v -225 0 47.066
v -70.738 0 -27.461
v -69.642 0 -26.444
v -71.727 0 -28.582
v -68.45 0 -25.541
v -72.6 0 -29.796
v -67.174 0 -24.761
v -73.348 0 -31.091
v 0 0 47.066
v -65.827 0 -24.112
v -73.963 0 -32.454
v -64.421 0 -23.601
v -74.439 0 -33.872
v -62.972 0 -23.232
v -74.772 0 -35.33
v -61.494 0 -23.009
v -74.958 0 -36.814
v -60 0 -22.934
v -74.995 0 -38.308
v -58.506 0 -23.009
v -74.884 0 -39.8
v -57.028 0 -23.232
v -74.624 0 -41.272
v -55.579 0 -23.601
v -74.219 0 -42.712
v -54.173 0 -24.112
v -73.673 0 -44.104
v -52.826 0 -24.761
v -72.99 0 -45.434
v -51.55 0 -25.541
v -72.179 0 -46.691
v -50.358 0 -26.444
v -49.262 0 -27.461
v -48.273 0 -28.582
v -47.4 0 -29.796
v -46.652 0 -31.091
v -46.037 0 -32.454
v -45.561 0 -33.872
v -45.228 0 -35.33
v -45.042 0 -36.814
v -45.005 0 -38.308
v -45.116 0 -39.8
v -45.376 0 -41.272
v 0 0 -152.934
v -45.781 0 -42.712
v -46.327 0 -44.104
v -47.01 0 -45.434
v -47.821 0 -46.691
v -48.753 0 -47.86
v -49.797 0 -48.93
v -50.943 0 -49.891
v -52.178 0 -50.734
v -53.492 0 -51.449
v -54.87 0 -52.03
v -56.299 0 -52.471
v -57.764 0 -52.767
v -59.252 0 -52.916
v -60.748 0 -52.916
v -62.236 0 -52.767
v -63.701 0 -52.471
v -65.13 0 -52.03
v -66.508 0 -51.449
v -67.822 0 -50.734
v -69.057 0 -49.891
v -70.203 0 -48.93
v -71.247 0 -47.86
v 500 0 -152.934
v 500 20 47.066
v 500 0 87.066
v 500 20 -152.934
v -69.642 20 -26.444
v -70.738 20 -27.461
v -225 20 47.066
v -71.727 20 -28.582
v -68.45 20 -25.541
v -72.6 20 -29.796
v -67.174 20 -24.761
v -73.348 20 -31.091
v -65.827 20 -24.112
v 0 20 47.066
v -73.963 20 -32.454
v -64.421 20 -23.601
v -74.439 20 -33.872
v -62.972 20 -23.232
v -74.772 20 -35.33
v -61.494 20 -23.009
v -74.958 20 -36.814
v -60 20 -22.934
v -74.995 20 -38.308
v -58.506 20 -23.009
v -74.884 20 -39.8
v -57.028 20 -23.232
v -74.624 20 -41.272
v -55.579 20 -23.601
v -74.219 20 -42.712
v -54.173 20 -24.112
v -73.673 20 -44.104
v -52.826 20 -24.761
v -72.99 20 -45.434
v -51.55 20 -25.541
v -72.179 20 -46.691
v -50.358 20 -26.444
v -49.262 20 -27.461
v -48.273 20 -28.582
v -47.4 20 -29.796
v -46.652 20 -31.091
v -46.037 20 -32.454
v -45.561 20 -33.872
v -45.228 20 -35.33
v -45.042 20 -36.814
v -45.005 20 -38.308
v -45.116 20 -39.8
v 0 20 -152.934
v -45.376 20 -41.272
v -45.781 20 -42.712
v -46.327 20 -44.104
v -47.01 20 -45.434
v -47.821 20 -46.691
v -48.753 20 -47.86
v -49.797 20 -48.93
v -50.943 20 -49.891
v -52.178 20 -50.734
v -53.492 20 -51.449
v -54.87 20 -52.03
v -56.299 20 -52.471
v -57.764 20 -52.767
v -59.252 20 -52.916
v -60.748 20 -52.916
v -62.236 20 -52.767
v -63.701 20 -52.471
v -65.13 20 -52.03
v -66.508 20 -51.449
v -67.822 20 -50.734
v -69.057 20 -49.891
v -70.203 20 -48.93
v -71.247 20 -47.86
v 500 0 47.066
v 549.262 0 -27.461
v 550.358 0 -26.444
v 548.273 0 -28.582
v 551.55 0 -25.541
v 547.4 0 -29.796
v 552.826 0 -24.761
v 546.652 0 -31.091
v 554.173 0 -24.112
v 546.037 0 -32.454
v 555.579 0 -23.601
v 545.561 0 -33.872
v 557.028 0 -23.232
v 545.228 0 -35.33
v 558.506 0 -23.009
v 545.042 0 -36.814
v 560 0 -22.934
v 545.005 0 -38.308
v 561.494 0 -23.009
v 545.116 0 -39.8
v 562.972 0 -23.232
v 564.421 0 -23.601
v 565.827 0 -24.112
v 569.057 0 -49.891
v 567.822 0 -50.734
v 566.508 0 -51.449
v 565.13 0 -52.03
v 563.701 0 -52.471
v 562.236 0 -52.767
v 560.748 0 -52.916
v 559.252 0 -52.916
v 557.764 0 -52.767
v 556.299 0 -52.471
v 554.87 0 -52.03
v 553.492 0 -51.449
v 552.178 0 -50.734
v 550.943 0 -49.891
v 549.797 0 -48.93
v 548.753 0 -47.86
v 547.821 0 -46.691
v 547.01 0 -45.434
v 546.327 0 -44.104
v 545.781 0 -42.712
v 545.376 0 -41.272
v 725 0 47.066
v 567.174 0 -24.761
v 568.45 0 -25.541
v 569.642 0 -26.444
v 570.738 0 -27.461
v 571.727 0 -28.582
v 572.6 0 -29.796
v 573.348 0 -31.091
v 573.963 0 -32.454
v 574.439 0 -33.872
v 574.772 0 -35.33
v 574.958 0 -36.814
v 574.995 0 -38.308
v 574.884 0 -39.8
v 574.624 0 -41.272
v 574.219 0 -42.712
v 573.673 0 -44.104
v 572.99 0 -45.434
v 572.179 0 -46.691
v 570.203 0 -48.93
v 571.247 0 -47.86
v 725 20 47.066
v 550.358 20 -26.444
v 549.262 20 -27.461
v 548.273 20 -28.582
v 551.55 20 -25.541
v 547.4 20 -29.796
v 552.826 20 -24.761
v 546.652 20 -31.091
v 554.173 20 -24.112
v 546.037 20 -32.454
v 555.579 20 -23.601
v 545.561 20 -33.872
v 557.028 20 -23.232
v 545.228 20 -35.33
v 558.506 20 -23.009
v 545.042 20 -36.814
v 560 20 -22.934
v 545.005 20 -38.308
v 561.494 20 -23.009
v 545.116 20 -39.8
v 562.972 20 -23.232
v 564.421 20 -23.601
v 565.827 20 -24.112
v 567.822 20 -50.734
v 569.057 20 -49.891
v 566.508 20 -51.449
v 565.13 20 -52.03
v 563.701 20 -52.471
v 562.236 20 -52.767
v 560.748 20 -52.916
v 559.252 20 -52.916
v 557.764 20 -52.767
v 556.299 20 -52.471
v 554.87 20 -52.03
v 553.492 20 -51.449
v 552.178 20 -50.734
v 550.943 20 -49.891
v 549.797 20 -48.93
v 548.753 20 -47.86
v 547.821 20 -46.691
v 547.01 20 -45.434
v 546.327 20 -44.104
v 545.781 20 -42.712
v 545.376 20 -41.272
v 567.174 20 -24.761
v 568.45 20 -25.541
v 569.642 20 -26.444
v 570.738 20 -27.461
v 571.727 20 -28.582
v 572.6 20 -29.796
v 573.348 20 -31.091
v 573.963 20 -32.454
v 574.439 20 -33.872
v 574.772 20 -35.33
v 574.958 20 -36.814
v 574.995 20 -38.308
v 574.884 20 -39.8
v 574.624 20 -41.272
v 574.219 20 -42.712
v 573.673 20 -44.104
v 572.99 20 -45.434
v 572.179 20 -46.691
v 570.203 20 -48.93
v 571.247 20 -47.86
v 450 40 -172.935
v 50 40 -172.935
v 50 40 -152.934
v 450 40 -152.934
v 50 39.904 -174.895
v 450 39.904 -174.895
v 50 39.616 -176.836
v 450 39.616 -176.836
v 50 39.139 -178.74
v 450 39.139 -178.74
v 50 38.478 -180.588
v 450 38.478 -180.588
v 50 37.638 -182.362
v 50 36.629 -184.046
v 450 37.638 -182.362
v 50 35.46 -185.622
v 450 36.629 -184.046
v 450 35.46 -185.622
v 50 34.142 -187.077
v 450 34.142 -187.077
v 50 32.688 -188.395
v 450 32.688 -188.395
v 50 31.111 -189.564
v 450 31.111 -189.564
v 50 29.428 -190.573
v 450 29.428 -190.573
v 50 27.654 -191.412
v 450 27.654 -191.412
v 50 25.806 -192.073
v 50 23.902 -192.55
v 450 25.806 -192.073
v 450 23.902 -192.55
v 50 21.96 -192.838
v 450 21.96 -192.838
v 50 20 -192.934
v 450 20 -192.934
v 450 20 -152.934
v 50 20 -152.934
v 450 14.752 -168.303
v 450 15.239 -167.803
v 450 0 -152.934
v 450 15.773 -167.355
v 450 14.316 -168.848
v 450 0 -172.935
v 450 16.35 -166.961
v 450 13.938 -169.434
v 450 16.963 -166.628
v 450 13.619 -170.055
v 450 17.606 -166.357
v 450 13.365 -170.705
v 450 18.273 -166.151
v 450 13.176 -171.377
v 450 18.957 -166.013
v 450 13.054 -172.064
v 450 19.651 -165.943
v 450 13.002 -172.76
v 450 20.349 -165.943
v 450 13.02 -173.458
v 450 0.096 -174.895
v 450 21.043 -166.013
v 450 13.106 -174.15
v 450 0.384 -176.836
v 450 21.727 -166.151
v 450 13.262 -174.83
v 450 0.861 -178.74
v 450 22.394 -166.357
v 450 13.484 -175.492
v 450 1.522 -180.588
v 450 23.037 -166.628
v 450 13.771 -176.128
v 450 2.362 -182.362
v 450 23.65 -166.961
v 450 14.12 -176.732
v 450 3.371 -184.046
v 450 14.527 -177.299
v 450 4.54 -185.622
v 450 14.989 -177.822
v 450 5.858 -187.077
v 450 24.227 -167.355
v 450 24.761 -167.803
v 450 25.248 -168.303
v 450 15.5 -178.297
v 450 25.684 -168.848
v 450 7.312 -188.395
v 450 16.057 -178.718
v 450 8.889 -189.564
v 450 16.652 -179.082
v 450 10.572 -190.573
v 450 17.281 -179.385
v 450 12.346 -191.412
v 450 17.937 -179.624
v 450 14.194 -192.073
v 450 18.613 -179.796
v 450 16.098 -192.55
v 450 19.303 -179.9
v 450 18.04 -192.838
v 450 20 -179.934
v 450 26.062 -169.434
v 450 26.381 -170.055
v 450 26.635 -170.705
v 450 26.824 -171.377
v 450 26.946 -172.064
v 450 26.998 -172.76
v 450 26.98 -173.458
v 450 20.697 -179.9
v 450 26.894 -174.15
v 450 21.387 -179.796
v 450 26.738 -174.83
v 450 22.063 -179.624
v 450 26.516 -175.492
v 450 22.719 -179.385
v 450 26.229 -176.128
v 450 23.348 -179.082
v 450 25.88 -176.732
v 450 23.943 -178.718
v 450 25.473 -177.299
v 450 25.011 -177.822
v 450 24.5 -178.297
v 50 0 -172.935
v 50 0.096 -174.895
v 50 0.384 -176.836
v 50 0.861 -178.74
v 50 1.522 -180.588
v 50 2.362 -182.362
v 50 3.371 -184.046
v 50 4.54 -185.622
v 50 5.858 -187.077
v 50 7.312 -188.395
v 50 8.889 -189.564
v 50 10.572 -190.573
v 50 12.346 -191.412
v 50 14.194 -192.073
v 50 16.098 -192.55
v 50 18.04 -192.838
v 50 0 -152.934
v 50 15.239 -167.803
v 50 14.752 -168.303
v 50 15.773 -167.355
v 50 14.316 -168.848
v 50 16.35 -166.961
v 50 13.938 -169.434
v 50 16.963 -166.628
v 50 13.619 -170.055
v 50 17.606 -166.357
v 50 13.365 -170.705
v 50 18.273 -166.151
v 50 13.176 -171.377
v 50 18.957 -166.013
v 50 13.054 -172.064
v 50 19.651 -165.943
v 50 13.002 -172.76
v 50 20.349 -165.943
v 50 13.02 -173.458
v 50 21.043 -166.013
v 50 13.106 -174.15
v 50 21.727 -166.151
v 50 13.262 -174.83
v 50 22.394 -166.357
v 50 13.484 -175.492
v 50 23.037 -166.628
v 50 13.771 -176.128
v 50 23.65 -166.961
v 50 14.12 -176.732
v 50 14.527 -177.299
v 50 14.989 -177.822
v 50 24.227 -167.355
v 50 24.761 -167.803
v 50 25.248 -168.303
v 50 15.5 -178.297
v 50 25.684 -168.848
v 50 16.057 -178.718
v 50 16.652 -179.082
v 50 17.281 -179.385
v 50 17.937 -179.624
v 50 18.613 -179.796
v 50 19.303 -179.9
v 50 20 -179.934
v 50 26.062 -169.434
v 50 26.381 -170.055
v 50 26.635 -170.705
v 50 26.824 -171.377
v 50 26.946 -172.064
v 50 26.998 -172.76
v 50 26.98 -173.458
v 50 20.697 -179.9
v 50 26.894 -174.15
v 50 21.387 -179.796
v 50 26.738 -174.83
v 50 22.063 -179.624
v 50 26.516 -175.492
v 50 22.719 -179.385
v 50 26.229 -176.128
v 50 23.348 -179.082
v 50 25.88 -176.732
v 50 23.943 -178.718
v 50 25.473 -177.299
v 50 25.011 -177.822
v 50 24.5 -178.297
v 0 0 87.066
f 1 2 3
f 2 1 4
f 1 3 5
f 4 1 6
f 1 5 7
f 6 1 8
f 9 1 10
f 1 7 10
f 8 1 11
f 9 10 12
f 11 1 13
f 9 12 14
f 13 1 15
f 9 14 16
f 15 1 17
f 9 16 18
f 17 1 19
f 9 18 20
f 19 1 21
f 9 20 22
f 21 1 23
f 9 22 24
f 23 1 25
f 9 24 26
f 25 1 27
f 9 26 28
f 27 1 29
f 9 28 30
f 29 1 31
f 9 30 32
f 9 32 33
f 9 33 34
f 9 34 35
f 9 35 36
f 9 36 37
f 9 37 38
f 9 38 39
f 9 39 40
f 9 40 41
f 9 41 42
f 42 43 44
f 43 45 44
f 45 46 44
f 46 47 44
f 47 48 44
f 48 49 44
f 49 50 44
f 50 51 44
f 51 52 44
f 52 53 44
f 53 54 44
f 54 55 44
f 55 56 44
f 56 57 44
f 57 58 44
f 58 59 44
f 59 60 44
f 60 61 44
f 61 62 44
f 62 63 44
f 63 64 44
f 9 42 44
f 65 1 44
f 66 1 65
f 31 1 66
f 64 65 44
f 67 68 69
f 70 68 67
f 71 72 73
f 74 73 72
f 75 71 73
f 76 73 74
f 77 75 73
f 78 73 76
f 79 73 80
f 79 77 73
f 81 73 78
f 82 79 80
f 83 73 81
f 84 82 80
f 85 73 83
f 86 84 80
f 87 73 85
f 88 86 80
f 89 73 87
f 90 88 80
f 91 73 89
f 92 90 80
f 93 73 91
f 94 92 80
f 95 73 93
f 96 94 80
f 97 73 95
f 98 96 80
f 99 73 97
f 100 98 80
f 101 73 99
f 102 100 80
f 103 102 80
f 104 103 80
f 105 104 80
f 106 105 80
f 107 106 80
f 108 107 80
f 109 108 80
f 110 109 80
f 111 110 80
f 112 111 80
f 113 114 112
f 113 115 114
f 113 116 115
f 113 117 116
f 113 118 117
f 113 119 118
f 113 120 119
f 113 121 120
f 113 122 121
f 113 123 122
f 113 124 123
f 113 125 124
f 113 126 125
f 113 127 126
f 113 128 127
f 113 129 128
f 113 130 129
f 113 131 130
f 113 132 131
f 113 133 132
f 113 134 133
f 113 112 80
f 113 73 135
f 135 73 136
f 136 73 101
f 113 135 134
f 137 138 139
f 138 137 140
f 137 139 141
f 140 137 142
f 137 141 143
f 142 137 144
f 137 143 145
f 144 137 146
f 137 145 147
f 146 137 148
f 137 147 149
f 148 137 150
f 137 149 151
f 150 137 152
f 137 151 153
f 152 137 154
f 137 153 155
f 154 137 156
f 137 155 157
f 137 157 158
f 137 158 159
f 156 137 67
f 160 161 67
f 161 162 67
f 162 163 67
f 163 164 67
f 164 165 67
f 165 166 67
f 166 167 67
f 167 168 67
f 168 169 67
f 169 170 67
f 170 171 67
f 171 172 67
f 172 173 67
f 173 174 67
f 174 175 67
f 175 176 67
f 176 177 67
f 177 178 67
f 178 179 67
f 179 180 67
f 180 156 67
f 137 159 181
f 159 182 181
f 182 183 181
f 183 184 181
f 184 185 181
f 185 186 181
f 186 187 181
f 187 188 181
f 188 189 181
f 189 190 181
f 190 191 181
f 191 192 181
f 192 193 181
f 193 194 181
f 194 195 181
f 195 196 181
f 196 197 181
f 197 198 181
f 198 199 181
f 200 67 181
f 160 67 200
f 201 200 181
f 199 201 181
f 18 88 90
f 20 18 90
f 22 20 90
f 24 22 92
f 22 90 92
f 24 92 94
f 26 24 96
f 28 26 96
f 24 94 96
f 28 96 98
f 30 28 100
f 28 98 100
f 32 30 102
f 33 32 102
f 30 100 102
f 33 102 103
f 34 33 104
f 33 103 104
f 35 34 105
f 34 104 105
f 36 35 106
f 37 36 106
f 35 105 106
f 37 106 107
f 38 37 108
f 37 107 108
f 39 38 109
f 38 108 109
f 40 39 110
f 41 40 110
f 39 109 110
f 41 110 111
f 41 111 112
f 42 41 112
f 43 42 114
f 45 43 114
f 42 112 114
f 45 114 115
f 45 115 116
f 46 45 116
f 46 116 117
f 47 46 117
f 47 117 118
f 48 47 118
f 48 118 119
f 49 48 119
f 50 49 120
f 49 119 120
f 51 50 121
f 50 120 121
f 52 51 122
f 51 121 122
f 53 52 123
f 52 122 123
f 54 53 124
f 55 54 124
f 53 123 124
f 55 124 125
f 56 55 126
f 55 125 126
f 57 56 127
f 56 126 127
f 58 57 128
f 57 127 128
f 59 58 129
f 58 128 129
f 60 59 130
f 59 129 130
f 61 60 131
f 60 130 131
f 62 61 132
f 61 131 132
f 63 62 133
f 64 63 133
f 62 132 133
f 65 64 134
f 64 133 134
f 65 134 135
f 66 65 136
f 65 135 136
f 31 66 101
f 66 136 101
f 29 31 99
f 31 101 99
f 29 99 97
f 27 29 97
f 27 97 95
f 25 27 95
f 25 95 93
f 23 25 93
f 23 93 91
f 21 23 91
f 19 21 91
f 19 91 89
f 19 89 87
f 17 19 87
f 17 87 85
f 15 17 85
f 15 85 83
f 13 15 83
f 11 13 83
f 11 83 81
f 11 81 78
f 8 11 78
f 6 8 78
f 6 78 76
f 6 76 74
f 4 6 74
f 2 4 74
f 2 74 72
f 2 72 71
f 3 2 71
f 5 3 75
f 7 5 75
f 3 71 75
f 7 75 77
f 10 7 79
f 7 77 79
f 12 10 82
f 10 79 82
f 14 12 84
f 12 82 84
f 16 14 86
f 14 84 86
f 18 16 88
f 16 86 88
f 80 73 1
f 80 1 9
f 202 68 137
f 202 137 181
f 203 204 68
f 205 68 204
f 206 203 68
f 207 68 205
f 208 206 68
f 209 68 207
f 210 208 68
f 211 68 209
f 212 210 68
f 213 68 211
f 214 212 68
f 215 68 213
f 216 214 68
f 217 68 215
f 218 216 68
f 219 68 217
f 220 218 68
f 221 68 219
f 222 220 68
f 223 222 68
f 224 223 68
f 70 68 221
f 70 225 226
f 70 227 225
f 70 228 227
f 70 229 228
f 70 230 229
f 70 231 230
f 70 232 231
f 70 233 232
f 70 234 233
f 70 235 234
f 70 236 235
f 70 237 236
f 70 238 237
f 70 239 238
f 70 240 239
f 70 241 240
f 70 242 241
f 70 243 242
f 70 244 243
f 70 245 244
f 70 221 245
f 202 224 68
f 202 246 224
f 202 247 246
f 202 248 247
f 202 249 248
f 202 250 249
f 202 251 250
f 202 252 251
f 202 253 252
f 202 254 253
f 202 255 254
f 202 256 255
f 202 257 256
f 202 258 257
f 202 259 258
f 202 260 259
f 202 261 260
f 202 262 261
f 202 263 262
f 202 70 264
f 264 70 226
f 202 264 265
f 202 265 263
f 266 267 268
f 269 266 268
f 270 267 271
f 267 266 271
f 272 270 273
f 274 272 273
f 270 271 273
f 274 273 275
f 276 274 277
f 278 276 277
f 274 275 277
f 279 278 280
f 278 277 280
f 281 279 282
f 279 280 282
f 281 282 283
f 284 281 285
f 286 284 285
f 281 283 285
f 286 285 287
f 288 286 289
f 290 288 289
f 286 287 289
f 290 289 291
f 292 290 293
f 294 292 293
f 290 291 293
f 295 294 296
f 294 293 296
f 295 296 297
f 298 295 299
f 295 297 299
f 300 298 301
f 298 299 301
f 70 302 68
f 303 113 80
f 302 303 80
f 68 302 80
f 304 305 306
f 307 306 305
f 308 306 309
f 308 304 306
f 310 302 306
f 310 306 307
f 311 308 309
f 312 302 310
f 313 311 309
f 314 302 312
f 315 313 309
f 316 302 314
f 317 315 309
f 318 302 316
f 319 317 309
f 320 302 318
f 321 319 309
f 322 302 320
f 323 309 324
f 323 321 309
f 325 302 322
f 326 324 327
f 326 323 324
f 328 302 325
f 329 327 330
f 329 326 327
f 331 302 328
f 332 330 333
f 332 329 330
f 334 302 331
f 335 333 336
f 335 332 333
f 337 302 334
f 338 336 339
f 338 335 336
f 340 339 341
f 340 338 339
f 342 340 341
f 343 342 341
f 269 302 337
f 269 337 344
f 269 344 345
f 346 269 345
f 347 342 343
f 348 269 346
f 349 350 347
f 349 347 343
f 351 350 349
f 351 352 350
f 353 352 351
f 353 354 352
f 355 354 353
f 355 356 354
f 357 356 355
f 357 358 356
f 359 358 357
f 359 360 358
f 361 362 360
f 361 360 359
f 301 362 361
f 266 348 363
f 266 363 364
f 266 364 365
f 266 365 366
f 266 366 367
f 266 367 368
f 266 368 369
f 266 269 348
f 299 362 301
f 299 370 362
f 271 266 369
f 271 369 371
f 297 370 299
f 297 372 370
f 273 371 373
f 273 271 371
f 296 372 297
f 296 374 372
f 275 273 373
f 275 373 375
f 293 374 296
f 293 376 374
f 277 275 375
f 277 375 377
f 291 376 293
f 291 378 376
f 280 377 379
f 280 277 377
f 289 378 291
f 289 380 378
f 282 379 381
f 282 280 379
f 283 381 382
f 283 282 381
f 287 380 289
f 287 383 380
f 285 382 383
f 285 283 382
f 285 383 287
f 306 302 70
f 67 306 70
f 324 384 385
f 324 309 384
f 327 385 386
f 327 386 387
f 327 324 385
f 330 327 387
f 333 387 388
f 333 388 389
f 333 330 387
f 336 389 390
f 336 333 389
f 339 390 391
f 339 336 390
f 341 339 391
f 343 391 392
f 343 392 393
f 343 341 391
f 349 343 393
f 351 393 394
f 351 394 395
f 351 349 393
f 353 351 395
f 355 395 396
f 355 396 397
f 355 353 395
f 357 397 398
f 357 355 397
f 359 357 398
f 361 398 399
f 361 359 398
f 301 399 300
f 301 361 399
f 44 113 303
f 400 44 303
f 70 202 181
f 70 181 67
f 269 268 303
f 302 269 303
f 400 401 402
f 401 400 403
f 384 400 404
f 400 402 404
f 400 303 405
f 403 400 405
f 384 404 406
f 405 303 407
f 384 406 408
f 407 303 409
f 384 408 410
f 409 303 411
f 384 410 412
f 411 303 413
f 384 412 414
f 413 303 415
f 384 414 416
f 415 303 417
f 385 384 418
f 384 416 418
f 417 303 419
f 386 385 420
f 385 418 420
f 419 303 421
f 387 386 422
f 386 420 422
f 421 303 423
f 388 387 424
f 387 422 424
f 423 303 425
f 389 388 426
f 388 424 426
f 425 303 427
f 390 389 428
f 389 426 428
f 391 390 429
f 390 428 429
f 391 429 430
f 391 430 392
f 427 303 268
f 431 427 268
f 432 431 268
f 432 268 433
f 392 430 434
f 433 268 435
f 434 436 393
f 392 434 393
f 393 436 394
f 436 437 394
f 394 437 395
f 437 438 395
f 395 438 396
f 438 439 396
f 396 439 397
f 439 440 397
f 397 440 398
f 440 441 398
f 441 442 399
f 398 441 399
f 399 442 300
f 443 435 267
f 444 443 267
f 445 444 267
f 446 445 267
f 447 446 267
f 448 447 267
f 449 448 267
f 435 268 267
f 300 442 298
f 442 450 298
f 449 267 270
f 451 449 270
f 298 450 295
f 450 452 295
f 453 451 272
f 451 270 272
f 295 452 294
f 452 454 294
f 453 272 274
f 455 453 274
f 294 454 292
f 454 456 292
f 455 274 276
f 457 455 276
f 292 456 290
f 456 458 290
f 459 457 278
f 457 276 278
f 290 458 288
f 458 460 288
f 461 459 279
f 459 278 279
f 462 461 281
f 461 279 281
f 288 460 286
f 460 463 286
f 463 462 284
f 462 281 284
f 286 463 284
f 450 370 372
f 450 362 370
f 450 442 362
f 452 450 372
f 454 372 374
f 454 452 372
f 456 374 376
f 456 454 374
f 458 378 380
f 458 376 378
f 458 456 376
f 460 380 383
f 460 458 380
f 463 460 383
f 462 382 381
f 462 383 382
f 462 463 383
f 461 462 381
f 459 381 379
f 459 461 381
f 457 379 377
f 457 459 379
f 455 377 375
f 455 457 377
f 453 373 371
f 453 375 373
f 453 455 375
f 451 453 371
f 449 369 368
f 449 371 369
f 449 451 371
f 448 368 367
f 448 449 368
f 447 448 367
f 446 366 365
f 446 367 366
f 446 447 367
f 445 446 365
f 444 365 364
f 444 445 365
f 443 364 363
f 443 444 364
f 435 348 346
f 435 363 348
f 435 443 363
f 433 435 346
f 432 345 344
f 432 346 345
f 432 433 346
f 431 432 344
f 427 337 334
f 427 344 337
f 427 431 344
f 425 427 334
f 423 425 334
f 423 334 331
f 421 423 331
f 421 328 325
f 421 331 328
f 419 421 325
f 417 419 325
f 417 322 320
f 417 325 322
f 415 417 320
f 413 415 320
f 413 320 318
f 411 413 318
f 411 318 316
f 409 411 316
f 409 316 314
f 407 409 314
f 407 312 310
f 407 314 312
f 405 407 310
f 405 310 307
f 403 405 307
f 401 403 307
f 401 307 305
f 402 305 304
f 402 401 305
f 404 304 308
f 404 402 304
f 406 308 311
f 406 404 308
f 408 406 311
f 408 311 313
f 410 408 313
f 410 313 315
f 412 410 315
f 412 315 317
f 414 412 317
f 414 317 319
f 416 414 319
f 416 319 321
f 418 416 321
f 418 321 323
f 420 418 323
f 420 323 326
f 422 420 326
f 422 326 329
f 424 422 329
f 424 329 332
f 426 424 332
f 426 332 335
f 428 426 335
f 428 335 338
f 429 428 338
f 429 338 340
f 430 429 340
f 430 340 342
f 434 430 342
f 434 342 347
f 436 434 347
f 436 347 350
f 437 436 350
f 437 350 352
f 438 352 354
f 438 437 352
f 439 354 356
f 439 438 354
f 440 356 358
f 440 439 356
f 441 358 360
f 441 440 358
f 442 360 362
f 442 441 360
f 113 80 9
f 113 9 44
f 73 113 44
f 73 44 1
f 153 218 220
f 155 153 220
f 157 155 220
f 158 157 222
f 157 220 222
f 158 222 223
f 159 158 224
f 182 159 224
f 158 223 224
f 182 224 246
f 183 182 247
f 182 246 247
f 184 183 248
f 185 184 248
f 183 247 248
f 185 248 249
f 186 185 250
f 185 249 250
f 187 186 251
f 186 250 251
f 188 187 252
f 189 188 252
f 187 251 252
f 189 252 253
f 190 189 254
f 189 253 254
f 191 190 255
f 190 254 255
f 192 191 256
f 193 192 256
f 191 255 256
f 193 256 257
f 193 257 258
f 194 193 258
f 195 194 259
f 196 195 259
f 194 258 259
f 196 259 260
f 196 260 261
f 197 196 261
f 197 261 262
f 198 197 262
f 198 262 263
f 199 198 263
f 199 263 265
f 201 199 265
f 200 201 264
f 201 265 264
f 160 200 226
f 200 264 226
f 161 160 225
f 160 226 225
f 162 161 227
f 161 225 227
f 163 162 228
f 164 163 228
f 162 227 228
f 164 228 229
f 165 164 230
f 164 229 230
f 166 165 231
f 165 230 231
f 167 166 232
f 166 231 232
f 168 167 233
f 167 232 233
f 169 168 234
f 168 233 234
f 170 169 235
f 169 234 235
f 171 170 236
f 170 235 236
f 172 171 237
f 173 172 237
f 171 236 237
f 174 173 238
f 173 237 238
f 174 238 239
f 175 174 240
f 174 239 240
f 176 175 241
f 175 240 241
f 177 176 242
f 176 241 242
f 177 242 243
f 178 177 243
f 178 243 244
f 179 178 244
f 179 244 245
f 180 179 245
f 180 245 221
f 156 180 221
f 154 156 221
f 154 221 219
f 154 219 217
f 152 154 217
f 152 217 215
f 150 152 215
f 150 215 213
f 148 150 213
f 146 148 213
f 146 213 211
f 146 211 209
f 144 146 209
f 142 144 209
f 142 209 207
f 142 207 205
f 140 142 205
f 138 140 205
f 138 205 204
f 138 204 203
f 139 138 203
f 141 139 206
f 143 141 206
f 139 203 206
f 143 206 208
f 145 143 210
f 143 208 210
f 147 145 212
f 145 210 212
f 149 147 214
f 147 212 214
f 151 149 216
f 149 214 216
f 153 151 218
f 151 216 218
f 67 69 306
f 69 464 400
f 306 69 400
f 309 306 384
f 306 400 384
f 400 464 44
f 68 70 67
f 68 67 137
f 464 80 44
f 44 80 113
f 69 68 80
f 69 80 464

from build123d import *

# Parameters (mm, degrees)
SKETCH_1_R          = 7
EXTRUDE_1_DEPTH     = 500
SKETCH_2_W          = 50
SKETCH_2_H          = 40
CUT_EXTRUDE_1_DEPTH = 500
SKETCH_3_R          = 15
EXTRUDE_2_DEPTH     = 20
EXTRUDE_2_2_DEPTH   = 20
FILLET_2_R          = 20


with BuildPart() as part:
    # 草图1 → 凸台-拉伸1 (new body)
    # profile 1 of 2: a face of its own
    with BuildSketch(Plane(origin=(0, 0, 0), x_dir=(0, 0, -1), z_dir=(1, 0, 0))):
        Polygon((152.934492446, 20), (152.934492446, 0), (192.934492446, 0), (192.934492446, 40), (152.934492446, 40), align=None)
        with Locations((172.934492446, 20)):
            Circle(SKETCH_1_R, mode=Mode.SUBTRACT)
    # profile 2 of 2: a face of its own
    with BuildSketch(Plane(origin=(0, 0, 0), x_dir=(0, 0, -1), z_dir=(1, 0, 0))):
        Polygon((152.934492446, 20), (-47.065507554, 20), (-87.065507554, 0), (152.934492446, 0), align=None)
    extrude(amount=EXTRUDE_1_DEPTH)

    # 草图2 → 切除-拉伸1 (cut)
    with BuildSketch(Plane(origin=(0, 40, 0), x_dir=(1, 0, 0), z_dir=(0, 1, 0))):
        with Locations((25, 172.934492446)):
            Rectangle(SKETCH_2_W, SKETCH_2_H)
        with Locations((475, 172.934492446)):
            Rectangle(SKETCH_2_W, SKETCH_2_H)
    extrude(amount=-CUT_EXTRUDE_1_DEPTH, mode=Mode.SUBTRACT)

    # 圆角2
    fillet_2_edges = [part.edges().sort_by_distance(p)[0] for p in [
        (250, 0, -192.934492446),
        (250, 40, -192.934492446),
    ]]
    fillet(fillet_2_edges, radius=FILLET_2_R - 0.0001)  # a hair under: the kernel refuses the full size


with BuildPart() as body_2:
    # 草图3 → 凸台-拉伸2 (new body)
    with BuildSketch(Plane(origin=(0, 20, 0), x_dir=(1, 0, 0), z_dir=(0, 1, 0))):
        Polygon((500, 152.934492446), (500, -47.065507554), (725, -47.065507554), align=None)
        with Locations(Location((560, 37.934492446, 0), (0, 0, 270))):
            Circle(SKETCH_3_R, mode=Mode.SUBTRACT)
    extrude(amount=-EXTRUDE_2_DEPTH)


with BuildPart() as body_3:
    # 草图3 → Extrude 2 2 (new body)
    with BuildSketch(Plane(origin=(0, 20, 0), x_dir=(1, 0, 0), z_dir=(0, 1, 0))):
        Polygon((-225, -47.065507554), (0, -47.065507554), (0, 152.934492446), align=None)
        with Locations(Location((-60, 37.934492446, 0), (0, 0, 270))):
            Circle(SKETCH_3_R, mode=Mode.SUBTRACT)
    extrude(amount=-EXTRUDE_2_2_DEPTH)


solid = Compound([part.part, body_2.part, body_3.part])
